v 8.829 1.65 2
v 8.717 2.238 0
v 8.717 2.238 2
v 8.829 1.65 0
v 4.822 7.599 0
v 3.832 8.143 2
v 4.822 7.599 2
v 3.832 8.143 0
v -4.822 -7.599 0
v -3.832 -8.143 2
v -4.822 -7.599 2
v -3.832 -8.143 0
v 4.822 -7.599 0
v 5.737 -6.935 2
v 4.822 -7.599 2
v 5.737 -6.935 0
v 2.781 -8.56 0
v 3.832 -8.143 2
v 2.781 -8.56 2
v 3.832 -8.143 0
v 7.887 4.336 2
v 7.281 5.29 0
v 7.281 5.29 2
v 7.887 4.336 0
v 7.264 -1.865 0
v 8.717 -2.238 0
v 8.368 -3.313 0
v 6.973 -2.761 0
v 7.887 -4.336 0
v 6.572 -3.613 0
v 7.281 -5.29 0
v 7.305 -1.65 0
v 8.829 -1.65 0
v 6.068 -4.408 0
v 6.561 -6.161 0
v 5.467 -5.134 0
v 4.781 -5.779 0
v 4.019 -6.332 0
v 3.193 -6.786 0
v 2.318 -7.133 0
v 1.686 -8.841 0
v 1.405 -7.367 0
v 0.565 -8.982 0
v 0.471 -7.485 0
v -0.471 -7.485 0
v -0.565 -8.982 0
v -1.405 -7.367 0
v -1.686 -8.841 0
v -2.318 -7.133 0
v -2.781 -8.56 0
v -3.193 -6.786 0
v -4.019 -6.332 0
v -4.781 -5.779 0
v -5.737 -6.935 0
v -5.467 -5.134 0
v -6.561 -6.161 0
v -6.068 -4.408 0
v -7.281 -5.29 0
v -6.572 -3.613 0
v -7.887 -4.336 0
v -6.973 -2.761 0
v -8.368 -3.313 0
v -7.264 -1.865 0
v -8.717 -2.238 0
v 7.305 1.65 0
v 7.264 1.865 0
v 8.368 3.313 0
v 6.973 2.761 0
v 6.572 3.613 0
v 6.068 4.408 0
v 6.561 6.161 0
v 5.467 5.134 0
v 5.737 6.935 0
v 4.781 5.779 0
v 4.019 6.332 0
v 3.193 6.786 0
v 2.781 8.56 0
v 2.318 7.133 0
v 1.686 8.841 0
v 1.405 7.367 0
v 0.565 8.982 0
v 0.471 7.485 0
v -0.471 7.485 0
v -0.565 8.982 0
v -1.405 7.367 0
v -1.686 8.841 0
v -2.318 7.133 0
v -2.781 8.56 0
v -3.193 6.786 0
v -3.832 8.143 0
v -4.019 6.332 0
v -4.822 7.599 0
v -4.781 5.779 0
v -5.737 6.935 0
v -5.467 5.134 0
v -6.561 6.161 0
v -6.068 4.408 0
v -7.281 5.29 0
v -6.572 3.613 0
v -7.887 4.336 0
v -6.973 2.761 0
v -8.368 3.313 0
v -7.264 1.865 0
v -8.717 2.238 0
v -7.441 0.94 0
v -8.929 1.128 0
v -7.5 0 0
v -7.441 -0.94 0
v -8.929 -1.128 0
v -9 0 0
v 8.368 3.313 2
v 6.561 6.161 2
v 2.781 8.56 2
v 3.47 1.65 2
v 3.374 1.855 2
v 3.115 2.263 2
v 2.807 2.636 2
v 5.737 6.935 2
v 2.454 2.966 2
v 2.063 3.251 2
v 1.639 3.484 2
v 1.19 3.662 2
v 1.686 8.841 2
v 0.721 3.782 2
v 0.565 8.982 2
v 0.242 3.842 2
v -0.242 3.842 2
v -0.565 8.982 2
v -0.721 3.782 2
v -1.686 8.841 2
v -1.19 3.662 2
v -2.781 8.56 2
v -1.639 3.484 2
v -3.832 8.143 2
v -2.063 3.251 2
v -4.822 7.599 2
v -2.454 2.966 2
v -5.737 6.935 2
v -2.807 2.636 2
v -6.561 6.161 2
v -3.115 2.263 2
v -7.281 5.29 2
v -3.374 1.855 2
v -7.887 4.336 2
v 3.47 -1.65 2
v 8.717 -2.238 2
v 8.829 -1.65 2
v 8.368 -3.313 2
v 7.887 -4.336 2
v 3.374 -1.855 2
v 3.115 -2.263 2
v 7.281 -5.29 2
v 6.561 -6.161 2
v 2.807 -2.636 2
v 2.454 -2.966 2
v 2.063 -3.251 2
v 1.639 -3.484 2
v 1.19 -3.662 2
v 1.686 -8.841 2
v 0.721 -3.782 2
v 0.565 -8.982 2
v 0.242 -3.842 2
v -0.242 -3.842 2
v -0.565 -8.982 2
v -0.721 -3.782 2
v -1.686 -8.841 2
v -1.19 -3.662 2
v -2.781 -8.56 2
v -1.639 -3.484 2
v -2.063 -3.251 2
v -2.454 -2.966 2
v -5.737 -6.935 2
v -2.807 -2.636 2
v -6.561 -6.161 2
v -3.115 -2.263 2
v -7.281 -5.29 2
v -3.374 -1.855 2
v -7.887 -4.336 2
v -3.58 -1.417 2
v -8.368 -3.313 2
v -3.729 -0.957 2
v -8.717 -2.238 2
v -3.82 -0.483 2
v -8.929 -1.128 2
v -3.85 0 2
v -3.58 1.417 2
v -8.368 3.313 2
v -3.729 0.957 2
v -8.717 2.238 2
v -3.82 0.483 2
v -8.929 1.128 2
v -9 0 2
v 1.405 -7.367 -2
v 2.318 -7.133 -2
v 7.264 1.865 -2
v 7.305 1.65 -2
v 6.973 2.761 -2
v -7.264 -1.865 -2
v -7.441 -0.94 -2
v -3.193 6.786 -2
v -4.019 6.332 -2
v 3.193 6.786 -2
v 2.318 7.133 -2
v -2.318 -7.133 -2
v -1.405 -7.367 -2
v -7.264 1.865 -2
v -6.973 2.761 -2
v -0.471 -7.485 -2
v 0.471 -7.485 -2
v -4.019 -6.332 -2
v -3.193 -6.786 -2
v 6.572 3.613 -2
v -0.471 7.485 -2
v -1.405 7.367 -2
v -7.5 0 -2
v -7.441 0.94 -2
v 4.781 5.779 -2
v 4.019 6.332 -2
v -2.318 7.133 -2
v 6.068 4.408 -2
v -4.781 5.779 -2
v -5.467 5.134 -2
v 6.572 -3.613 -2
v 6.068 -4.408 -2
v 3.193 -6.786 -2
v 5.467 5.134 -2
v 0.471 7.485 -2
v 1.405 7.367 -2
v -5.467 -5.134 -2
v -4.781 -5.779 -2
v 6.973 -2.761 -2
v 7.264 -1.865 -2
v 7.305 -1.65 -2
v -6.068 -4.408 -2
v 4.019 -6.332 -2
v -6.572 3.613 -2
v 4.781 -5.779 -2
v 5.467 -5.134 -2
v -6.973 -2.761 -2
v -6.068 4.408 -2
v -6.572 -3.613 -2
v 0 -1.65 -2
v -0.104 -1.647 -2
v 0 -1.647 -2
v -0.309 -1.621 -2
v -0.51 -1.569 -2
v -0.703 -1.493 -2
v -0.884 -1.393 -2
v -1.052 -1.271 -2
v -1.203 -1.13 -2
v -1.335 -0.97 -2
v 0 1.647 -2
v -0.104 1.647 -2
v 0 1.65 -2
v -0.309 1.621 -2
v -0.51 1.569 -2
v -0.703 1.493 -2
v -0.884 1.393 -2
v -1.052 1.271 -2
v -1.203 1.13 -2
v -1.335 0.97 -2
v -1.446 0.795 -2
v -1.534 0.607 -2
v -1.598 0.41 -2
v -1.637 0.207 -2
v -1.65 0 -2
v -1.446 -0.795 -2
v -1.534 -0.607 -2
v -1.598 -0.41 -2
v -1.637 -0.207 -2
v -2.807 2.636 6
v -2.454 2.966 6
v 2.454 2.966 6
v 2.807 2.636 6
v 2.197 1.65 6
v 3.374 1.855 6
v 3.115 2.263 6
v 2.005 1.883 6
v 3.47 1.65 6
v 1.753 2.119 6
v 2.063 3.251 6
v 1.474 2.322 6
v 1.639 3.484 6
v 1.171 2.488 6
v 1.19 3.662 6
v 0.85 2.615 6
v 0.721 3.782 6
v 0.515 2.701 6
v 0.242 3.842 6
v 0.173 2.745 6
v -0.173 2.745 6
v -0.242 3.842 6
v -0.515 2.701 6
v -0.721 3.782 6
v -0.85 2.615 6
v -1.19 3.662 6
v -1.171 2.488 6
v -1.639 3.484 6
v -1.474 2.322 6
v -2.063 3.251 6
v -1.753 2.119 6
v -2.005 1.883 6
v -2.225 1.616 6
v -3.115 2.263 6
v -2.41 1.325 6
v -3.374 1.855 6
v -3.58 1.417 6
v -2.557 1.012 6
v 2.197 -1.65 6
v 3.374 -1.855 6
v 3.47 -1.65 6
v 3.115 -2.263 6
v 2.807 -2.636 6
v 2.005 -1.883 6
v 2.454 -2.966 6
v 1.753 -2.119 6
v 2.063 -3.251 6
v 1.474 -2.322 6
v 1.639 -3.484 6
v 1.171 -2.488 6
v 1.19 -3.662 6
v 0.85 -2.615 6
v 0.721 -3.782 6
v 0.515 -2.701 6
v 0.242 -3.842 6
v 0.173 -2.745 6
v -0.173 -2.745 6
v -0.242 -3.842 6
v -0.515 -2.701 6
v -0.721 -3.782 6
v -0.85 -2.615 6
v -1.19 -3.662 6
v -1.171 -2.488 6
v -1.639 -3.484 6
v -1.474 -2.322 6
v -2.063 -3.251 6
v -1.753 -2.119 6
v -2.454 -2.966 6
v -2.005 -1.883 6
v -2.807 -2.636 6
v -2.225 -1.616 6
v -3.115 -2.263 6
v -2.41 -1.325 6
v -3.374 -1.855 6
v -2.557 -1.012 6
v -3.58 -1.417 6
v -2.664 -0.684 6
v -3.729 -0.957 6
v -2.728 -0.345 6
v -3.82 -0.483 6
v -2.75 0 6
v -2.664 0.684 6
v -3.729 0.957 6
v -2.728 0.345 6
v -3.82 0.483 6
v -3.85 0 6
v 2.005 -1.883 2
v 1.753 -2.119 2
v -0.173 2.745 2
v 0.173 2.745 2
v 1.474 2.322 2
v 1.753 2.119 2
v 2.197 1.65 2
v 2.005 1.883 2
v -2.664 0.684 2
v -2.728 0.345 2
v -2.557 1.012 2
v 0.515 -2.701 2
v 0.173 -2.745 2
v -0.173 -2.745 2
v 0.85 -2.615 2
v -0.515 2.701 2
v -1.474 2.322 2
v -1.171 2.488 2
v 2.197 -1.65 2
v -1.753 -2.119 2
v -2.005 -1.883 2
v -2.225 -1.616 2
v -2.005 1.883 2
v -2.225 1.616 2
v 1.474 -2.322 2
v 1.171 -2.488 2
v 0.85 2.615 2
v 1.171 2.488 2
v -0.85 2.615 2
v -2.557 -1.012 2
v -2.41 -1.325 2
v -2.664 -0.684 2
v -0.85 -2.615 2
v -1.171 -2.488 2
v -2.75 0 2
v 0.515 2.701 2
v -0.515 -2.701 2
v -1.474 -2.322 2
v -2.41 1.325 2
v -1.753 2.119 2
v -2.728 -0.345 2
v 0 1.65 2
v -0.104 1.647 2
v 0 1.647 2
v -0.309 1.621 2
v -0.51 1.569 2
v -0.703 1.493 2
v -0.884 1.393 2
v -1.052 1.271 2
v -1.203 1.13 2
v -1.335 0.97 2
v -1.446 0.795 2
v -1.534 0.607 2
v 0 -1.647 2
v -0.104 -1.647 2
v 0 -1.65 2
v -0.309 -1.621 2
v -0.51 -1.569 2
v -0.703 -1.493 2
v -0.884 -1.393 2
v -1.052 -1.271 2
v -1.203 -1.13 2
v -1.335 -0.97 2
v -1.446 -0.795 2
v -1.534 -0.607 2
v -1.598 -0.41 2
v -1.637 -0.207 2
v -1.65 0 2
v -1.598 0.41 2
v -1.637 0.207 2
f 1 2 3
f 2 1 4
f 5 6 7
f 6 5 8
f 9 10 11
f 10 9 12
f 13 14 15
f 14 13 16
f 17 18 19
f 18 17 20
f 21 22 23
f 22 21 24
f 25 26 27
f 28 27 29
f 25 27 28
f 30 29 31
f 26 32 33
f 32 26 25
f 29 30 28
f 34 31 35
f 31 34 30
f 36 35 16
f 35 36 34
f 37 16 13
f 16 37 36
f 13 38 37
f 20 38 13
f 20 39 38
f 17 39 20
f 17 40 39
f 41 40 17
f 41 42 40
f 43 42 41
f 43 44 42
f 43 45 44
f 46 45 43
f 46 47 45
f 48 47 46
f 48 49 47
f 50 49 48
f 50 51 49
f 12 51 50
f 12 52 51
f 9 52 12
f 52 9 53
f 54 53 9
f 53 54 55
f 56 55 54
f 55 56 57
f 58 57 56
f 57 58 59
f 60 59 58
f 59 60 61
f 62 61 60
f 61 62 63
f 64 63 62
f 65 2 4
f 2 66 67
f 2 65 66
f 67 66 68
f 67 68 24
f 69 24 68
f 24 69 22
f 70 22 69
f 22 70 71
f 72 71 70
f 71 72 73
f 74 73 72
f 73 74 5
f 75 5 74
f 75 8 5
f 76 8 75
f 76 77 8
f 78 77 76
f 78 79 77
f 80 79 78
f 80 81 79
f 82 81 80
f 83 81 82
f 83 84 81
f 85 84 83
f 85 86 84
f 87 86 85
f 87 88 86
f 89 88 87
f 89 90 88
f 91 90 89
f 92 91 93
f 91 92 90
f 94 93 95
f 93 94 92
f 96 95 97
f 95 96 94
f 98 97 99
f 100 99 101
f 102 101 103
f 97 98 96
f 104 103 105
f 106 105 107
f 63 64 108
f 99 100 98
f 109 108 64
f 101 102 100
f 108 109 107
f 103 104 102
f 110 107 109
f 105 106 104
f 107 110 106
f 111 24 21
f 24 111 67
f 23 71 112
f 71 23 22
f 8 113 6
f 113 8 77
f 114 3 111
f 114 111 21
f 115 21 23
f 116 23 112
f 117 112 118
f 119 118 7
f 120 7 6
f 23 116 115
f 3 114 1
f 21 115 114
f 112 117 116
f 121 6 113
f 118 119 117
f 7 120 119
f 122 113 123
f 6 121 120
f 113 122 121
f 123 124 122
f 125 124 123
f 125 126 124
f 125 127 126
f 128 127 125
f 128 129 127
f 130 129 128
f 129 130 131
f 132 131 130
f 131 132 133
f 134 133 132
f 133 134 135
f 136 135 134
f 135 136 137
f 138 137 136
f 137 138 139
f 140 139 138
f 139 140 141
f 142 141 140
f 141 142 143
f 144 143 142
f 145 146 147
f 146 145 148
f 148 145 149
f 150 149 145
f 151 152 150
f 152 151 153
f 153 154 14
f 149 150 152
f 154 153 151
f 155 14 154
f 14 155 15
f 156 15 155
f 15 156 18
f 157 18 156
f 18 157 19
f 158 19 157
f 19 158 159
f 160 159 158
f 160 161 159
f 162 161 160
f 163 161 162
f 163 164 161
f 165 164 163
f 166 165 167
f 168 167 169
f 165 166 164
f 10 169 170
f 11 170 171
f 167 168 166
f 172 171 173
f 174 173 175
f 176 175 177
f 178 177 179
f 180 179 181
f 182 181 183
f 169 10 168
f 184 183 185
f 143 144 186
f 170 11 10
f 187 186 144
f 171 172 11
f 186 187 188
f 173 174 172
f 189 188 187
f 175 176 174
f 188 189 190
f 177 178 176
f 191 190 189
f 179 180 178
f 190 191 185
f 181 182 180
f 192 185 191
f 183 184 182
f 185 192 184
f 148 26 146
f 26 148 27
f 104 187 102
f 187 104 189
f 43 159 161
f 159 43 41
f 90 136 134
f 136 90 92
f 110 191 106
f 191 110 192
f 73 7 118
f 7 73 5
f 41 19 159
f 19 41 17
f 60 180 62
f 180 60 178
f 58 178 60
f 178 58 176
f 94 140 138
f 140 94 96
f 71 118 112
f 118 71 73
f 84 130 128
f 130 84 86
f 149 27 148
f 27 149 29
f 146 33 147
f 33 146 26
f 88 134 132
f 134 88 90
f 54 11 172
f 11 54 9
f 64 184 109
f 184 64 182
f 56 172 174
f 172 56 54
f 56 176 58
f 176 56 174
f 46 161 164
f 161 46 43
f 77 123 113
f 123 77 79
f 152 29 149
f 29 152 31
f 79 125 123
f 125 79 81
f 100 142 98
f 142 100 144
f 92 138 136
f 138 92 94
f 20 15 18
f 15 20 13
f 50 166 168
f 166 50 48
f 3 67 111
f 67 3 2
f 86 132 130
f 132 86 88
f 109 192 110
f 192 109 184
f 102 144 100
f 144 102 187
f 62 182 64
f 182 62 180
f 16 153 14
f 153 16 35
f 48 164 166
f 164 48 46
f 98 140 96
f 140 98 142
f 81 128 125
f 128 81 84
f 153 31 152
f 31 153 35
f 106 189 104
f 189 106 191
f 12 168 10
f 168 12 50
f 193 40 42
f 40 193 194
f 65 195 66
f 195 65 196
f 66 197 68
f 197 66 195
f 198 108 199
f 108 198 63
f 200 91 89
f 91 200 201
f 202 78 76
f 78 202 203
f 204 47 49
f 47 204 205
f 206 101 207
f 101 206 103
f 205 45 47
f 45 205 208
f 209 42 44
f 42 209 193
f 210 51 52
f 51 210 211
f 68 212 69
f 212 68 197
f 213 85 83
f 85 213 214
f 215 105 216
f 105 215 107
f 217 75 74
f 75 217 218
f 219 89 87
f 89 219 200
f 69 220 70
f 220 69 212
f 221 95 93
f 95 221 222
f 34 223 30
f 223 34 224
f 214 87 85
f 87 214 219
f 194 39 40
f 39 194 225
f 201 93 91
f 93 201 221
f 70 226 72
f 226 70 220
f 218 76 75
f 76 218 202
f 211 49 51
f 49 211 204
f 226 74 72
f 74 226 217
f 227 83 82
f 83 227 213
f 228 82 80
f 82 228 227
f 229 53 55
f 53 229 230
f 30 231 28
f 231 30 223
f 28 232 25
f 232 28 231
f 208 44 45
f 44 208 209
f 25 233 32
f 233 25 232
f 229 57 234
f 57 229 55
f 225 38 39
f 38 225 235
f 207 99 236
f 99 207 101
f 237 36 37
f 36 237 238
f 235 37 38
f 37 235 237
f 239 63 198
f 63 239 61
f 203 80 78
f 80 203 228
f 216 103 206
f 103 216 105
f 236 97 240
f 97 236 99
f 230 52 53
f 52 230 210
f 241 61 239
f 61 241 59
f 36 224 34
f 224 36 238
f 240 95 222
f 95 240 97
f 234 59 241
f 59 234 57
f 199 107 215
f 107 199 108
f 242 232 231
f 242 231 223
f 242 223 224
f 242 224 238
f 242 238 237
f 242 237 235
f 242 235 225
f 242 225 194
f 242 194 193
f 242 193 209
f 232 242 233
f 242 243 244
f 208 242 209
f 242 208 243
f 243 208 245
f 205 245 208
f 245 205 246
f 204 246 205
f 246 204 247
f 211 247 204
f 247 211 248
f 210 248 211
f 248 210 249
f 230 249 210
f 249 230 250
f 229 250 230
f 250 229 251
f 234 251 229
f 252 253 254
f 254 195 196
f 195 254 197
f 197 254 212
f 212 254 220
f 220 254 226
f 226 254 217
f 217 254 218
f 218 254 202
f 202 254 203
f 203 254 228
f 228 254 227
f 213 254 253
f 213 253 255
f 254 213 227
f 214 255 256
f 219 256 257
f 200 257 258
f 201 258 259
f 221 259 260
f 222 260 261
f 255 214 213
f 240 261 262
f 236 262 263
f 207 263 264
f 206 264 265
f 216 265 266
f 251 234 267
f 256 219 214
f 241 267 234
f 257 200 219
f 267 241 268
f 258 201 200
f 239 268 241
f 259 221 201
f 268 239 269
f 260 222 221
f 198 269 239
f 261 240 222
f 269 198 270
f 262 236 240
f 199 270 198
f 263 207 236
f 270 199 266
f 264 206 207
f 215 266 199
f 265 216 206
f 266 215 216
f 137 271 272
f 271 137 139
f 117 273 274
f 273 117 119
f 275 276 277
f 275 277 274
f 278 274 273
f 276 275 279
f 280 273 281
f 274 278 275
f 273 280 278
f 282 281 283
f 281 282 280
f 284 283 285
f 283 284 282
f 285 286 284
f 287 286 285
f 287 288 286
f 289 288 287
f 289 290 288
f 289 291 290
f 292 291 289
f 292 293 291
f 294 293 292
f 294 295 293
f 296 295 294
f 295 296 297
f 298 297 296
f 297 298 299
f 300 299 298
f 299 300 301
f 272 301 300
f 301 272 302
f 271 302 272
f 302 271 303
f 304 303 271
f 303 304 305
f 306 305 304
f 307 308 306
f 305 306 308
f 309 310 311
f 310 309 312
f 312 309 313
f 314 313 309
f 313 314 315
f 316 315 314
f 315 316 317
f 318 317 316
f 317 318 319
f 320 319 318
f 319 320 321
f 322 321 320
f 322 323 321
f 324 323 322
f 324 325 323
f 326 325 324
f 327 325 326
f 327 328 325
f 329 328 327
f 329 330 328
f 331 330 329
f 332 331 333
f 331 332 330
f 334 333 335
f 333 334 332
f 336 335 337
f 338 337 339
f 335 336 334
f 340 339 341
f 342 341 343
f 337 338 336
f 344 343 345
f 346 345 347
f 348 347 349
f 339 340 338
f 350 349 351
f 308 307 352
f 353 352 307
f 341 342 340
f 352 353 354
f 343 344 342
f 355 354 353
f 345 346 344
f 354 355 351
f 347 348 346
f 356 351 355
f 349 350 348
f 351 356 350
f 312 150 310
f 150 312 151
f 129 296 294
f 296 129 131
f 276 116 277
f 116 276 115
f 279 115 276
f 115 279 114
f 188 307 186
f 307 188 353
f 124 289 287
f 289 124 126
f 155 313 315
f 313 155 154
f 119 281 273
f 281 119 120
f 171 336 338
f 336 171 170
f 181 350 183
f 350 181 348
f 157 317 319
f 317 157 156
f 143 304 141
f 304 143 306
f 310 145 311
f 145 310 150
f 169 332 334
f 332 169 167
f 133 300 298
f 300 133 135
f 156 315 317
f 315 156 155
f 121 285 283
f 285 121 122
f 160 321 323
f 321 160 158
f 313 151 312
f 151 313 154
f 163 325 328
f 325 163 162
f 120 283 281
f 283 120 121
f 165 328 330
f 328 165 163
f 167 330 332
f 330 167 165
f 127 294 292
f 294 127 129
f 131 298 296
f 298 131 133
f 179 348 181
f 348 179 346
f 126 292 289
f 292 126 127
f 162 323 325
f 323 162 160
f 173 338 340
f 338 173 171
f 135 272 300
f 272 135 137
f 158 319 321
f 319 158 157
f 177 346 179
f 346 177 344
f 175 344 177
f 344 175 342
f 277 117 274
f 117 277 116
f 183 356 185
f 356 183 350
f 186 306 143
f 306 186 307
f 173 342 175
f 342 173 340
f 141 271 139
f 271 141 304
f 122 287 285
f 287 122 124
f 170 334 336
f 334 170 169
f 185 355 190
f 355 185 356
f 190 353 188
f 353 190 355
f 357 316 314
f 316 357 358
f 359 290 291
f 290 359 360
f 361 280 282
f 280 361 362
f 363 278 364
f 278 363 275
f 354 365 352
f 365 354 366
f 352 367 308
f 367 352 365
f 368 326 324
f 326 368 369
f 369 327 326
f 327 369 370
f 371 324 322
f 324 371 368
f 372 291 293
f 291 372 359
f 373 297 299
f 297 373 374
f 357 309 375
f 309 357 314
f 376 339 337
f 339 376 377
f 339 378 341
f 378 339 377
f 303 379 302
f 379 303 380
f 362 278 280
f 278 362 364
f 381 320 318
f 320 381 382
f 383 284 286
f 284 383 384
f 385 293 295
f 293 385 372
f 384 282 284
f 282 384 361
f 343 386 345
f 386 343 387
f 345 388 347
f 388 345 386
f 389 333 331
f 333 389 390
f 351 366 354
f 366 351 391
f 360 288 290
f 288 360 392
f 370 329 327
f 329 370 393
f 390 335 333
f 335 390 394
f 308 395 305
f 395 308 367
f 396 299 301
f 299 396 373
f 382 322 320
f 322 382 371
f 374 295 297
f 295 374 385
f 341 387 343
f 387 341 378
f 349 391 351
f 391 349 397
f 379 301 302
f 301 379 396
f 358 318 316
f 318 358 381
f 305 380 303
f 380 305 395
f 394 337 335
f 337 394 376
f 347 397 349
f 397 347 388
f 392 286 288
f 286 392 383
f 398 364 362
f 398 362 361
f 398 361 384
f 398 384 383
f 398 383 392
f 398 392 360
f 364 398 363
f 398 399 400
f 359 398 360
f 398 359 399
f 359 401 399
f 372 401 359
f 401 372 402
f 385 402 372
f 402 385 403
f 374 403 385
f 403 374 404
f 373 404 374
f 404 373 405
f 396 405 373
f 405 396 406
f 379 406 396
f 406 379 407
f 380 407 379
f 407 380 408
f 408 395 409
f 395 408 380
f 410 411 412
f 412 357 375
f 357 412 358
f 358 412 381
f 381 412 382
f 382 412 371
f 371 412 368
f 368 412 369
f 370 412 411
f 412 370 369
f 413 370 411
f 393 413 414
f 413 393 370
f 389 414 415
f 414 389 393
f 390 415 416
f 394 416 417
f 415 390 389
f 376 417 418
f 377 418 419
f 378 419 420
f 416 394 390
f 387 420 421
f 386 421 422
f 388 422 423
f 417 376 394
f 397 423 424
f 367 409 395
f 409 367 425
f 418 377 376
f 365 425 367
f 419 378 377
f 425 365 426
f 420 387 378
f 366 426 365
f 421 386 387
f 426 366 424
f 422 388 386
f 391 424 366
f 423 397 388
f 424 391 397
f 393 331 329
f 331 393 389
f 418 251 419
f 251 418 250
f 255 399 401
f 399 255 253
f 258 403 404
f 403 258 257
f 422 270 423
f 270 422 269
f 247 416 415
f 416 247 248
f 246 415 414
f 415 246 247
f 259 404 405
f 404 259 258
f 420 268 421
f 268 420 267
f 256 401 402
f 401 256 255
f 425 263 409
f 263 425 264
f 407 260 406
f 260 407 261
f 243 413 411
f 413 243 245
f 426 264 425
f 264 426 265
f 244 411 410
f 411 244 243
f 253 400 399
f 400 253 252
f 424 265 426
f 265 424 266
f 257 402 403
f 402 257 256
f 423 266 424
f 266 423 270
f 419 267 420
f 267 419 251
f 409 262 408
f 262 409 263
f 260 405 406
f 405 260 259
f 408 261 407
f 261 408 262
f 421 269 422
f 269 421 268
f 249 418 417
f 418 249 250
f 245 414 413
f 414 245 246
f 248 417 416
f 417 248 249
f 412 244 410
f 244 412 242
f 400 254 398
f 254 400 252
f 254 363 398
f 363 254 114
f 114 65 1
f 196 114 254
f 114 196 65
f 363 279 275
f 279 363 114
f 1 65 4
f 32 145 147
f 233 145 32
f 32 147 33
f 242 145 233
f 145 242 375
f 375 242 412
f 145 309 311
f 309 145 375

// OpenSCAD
$fn=50;

difference(){
  base();

  translate([0,0,2]){
    cylinder(h=4.1,d=5.5);
  }
  translate([0,0,-10]){
    cylinder(h=20,d=3.3);
  }
  translate([0,-3.3/2,-10]){
    cube([10,3.3,20], center=false);
  }
}

module base(){
  cylinder(h=2,d=18);
  translate([0,0,-2]){
    cylinder(h=2.5,d=15);
  }
  translate([0,0,2]){
    cylinder(h=4,d=7.7);
  }
}
